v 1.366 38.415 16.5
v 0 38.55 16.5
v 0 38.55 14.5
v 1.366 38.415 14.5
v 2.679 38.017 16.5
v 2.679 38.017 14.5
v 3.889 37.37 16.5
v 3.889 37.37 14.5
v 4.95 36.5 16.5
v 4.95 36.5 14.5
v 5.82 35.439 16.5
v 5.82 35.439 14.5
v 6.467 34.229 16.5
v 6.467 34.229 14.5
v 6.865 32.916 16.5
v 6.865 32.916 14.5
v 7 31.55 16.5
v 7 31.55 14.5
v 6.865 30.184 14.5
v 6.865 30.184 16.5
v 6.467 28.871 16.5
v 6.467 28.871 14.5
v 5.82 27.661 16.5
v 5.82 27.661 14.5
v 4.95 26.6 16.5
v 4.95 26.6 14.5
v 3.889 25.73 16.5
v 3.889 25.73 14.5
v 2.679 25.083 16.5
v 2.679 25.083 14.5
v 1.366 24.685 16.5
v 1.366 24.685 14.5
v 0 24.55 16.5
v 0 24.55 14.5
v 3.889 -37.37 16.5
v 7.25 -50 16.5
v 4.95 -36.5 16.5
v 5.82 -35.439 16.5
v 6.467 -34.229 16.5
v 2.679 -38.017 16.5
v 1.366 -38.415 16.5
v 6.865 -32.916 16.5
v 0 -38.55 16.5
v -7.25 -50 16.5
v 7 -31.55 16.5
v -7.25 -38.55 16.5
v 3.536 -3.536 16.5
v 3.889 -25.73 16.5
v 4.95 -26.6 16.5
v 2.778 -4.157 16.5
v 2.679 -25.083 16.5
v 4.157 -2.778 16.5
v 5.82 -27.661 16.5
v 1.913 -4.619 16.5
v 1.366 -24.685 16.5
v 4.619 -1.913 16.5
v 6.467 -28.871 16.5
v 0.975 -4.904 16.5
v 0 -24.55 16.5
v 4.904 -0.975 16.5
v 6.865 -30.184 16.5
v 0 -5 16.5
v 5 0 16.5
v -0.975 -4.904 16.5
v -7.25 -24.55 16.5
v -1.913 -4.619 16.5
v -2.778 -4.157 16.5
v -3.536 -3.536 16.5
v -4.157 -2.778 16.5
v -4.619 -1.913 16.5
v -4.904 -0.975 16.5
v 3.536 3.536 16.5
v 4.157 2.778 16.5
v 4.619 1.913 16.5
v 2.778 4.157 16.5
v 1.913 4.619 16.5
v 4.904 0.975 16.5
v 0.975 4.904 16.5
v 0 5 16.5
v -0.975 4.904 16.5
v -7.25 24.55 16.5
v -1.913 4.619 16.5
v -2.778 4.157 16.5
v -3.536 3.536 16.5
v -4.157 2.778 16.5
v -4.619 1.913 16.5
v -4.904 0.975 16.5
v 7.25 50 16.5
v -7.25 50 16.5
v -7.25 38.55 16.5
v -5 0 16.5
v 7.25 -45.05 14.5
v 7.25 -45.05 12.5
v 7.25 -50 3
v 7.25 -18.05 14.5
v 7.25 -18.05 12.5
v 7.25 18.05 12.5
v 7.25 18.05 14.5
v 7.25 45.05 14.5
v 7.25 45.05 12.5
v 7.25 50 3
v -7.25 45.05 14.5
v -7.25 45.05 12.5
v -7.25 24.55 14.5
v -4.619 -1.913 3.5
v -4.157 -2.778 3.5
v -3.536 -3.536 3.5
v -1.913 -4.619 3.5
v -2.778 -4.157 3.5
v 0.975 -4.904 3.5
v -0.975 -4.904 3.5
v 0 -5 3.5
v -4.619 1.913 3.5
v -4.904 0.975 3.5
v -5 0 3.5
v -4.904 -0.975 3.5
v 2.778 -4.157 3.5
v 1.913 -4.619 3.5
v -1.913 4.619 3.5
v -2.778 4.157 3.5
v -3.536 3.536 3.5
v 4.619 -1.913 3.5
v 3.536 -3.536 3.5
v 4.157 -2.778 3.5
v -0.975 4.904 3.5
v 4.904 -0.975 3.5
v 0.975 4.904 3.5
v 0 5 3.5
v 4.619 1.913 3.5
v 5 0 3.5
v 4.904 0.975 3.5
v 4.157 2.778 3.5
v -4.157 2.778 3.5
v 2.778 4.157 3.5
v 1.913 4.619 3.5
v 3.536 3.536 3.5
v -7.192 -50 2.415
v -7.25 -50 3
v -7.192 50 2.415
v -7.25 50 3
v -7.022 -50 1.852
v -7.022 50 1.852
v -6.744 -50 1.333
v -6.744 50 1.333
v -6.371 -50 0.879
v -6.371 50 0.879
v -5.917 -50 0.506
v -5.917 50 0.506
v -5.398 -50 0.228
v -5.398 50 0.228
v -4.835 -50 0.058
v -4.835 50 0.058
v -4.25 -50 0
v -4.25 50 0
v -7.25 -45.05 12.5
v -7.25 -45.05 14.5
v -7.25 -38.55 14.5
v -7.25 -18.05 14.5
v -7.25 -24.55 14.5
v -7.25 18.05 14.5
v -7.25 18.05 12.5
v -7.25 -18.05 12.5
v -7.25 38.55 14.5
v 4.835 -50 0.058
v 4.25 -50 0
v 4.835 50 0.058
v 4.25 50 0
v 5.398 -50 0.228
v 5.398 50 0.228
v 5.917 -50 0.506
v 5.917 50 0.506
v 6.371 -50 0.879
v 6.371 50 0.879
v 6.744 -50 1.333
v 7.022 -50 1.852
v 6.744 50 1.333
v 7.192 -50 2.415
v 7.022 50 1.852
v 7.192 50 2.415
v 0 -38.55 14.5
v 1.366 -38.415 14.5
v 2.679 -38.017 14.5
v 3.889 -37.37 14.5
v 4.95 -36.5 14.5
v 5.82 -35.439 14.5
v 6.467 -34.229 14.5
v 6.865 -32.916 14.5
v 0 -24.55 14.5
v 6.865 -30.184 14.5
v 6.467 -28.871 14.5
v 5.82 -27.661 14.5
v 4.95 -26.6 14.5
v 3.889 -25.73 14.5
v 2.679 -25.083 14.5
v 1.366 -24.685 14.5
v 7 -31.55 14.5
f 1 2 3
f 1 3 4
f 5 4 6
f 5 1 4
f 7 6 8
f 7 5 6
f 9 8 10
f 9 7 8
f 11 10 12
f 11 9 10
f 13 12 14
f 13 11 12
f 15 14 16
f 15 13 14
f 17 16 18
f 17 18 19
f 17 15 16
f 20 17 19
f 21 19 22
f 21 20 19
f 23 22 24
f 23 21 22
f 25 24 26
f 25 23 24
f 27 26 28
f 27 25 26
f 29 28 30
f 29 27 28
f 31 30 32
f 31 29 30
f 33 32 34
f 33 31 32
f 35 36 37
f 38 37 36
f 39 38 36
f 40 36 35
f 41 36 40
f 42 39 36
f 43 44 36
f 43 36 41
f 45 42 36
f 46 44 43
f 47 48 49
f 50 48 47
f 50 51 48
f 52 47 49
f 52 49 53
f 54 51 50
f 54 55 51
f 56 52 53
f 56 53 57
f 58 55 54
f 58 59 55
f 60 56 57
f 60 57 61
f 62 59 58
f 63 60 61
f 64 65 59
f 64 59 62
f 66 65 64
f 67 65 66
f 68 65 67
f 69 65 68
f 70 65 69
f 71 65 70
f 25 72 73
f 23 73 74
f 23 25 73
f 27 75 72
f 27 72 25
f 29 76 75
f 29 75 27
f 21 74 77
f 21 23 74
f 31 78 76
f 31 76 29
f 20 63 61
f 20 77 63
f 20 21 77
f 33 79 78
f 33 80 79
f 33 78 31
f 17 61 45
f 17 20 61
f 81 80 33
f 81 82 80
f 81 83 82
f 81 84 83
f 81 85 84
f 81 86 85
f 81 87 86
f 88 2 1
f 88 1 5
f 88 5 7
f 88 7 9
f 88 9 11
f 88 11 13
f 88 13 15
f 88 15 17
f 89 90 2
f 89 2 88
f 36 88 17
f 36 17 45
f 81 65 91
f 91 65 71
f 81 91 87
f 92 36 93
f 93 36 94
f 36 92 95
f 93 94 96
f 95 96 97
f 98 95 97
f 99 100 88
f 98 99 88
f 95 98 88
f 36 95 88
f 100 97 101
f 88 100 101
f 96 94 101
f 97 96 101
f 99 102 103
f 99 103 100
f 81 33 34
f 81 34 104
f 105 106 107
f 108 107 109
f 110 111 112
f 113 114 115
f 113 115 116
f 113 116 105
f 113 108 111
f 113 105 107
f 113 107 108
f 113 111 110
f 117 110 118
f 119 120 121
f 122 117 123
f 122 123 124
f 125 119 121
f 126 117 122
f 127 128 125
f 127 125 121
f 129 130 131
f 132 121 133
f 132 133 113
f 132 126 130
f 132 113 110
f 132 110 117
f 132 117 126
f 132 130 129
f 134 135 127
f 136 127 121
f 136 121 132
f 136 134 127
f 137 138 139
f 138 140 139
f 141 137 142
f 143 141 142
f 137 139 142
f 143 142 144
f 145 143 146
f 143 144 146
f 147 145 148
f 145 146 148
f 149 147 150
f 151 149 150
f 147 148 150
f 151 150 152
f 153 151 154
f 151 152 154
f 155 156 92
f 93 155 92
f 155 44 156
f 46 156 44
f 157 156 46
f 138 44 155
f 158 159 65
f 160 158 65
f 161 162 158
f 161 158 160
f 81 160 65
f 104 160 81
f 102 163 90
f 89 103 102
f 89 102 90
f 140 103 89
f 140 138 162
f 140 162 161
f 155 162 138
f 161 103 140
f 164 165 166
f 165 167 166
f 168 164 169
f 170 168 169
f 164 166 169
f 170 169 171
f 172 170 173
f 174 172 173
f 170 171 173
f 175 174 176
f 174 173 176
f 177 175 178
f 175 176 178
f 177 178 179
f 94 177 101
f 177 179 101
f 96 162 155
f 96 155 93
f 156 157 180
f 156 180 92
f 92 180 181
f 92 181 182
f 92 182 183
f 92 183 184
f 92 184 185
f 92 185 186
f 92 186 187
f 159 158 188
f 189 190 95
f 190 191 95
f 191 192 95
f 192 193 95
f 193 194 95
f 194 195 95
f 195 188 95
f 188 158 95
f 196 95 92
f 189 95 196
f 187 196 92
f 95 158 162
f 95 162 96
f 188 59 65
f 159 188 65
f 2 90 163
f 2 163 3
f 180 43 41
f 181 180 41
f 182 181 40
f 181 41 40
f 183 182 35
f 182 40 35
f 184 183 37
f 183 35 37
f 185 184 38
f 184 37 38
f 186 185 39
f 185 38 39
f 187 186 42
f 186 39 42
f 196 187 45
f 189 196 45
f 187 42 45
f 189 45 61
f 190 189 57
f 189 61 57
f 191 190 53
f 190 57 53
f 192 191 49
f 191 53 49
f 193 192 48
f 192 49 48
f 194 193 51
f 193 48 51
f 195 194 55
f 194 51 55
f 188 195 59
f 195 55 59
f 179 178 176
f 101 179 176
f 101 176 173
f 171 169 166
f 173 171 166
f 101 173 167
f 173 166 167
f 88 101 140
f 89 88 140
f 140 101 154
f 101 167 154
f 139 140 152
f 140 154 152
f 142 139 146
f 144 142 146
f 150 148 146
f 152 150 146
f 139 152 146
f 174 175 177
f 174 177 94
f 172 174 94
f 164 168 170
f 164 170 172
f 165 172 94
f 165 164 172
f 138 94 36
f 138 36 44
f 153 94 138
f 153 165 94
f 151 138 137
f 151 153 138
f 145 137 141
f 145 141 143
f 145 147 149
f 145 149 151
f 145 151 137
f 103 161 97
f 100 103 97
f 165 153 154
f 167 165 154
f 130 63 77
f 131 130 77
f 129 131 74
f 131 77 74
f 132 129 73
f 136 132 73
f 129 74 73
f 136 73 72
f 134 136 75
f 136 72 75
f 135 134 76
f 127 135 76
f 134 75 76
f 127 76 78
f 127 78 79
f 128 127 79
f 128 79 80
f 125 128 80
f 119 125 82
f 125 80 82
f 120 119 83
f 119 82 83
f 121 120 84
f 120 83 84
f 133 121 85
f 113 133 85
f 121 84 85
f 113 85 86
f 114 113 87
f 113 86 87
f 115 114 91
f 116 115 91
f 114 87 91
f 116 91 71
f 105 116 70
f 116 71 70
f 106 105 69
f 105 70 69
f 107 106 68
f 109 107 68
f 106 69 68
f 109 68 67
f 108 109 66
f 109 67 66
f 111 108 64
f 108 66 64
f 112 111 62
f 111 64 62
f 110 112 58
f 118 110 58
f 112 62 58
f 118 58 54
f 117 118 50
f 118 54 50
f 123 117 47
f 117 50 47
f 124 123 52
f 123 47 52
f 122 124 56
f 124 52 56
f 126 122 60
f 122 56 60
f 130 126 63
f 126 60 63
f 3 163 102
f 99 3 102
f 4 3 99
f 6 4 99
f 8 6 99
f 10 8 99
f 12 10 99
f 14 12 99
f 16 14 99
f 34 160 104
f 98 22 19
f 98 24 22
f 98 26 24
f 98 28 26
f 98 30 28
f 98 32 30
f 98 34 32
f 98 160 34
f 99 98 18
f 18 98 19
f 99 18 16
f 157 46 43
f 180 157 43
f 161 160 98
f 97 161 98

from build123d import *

# Parameters (mm, degrees)
SKETCH7_W           = 100
SKETCH7_H           = 14.5
BOSS_EXTRUDE1_DEPTH = 16.5
SKETCH8_R           = 5
CUT_EXTRUDE2_DEPTH  = 13
CUT_EXTRUDE3_START  = -2
SKETCH9_W           = 27
SKETCH9_H           = 27
CUT_EXTRUDE3_DEPTH  = 2
CUT_EXTRUDE4_DEPTH  = 2
FILLET1_R           = 3
FILLET2_R           = 3


with BuildPart() as part:
    # Sketch7 → Boss-Extrude1 (new body)
    with BuildSketch(Plane(origin=(0, 0, 0), x_dir=(0, 1, 0), z_dir=(0, 0, 1))):
        Rectangle(SKETCH7_W, SKETCH7_H)
    extrude(amount=BOSS_EXTRUDE1_DEPTH)

    # Sketch8 → Cut-Extrude2 (cut)
    with BuildSketch(Plane(origin=(0, 0, 16.5), x_dir=(0, -1, 0), z_dir=(0, 0, 1))):
        with Locations(Location((0, 0, 0), (0, 0, 90))):
            Circle(SKETCH8_R)
    extrude(amount=-CUT_EXTRUDE2_DEPTH, mode=Mode.SUBTRACT)

    # Sketch9 → Cut-Extrude3 (cut)
    with BuildSketch(Plane.XY.offset(16.5).offset(CUT_EXTRUDE3_START)):
        with Locations((0, -31.55)):
            Rectangle(SKETCH9_W, SKETCH9_H)
    cut_extrude3 = extrude(amount=-CUT_EXTRUDE3_DEPTH, mode=Mode.SUBTRACT)

    # Sketch10 → Cut-Extrude4 (cut)
    with BuildSketch(Plane.XY.offset(16.5)):
        with BuildLine():
            Line((0, -24.55), (-7.25, -24.55))
            Line((-7.25, -24.55), (-7.25, -38.55))
            Line((-7.25, -38.55), (0, -38.55))
            ThreePointArc((0, -38.55), (7, -31.55), (0, -24.55))
        make_face()
    cut_extrude4 = extrude(amount=-CUT_EXTRUDE4_DEPTH, mode=Mode.SUBTRACT)

    # Mirror1: Cut-Extrude3 across plane
    add(cut_extrude3.mirror(Plane.ZX), mode=Mode.SUBTRACT)

    # Mirror2: Cut-Extrude4 across plane
    add(cut_extrude4.mirror(Plane.ZX), mode=Mode.SUBTRACT)

    # Fillet1
    fillet1_edges = [part.edges().sort_by_distance(p)[0] for p in [
        (-7.25, 0, 0),
    ]]
    fillet(fillet1_edges, radius=FILLET1_R)

    # Fillet2
    fillet2_edges = [part.edges().sort_by_distance(p)[0] for p in [
        (7.25, 0, 0),
    ]]
    fillet(fillet2_edges, radius=FILLET2_R)


solid = part.part
